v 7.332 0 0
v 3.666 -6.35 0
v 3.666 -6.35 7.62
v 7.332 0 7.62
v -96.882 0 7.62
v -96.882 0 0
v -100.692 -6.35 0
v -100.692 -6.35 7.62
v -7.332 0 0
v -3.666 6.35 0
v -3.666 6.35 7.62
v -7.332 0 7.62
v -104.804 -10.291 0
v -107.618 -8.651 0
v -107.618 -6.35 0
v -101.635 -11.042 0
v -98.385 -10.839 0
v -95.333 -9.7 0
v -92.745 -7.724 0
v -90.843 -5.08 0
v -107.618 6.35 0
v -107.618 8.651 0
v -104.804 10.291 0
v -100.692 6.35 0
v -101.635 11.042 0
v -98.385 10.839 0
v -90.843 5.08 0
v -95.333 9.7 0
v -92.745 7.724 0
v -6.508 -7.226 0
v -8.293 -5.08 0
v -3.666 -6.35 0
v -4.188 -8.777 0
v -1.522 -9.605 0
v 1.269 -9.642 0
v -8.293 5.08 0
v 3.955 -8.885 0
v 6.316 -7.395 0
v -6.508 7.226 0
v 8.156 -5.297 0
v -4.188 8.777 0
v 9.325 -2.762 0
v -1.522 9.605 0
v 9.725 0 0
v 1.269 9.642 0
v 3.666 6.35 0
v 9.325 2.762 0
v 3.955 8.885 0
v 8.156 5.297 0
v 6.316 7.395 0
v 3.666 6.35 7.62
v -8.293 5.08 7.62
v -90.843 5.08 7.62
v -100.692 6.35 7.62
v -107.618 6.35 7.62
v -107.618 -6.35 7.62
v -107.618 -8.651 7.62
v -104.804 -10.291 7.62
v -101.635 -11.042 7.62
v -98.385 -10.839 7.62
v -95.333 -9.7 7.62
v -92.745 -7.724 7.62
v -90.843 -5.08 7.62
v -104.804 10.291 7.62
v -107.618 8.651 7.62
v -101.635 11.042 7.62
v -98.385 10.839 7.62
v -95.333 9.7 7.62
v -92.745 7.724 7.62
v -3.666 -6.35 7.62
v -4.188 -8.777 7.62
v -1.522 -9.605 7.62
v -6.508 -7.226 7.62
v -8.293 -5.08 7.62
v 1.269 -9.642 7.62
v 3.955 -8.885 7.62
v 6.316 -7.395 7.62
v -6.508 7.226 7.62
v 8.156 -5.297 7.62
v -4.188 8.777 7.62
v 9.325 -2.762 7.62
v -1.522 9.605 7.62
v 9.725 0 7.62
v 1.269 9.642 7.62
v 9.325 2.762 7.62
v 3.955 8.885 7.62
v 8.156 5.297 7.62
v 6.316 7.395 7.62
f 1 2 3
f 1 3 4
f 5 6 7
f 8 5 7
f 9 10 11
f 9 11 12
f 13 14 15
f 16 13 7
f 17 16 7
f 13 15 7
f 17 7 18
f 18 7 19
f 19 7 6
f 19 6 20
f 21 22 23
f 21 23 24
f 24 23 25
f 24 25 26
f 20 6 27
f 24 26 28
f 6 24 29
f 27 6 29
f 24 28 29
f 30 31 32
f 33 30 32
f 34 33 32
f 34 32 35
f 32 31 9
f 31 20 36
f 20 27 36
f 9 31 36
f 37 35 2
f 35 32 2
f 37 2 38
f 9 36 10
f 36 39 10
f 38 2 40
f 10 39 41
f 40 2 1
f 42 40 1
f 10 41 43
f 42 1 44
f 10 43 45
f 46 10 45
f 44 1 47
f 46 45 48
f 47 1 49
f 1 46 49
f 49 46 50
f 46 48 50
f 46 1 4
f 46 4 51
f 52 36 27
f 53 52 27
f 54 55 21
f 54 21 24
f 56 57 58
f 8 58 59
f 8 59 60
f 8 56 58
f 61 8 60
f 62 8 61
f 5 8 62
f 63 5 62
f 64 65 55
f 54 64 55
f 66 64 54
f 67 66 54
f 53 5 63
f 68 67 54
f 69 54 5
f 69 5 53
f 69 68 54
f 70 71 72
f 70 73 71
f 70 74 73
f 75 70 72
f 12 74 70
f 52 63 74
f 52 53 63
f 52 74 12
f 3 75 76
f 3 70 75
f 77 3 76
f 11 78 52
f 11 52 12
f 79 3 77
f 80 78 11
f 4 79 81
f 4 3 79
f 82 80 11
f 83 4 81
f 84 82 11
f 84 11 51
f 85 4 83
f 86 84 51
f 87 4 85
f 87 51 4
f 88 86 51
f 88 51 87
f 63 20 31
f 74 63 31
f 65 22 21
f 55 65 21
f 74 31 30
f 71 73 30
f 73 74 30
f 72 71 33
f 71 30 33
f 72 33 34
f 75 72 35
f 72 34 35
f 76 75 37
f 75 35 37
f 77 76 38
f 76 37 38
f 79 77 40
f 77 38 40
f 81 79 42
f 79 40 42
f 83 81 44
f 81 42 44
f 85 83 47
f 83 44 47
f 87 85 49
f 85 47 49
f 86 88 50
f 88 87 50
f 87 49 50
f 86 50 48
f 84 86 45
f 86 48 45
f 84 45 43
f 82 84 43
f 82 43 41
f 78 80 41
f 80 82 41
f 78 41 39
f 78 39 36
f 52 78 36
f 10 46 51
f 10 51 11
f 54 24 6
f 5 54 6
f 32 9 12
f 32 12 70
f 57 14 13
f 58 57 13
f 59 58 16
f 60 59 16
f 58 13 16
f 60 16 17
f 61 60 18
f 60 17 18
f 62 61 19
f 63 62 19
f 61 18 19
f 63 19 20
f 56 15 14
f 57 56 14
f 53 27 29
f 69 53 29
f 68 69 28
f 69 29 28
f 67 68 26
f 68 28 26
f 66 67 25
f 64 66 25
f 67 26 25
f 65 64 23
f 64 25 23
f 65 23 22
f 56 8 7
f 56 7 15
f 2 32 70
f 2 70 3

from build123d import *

# Parameters (mm, degrees)
SKETCH3_R           = 9.725108951
BOSS_EXTRUDE1_DEPTH = 7.62


with BuildPart() as part:
    # Sketch3 → Boss-Extrude1 (new body)
    # profile 1 of 3: a face of its own
    with BuildSketch(Plane.XY):
        with BuildLine():
            ThreePointArc((-107.617835055, -8.650731277), (-89.609901884, 0), (-107.617835055, 8.650731277))
            Line((-107.617835055, 8.650731277), (-107.617835055, 6.35))
            Line((-107.617835055, 6.35), (-100.691706912, 6.35))
            Line((-100.691706912, 6.35), (-96.881706912, 0))
            Line((-96.881706912, 0), (-100.691706912, -6.35))
            Line((-100.691706912, -6.35), (-107.617835055, -6.35))
            Line((-107.617835055, -6.35), (-107.617835055, -8.650731277))
        make_face()
    # profile 2 of 3: a face of its own
    with BuildSketch(Plane.XY):
        with BuildLine():
            ThreePointArc((-90.842848974, 5.08), (-89.609901884, 0), (-90.842848974, -5.08))
            Line((-90.842848974, -5.08), (-8.292848974, -5.08))
            ThreePointArc((-8.292848974, -5.08), (-9.725108951, 0), (-8.292848974, 5.08))
            Line((-8.292848974, 5.08), (-90.842848974, 5.08))
        make_face()
    # profile 3 of 3: a face of its own
    with BuildSketch(Plane.XY):
        Circle(SKETCH3_R)
        Polygon((3.666174209, -6.35), (7.332348419, 0), (3.666174209, 6.35), (-3.666174209, 6.35), (-7.332348419, 0), (-3.666174209, -6.35), align=None, mode=Mode.SUBTRACT)
    extrude(amount=BOSS_EXTRUDE1_DEPTH)


solid = part.part
